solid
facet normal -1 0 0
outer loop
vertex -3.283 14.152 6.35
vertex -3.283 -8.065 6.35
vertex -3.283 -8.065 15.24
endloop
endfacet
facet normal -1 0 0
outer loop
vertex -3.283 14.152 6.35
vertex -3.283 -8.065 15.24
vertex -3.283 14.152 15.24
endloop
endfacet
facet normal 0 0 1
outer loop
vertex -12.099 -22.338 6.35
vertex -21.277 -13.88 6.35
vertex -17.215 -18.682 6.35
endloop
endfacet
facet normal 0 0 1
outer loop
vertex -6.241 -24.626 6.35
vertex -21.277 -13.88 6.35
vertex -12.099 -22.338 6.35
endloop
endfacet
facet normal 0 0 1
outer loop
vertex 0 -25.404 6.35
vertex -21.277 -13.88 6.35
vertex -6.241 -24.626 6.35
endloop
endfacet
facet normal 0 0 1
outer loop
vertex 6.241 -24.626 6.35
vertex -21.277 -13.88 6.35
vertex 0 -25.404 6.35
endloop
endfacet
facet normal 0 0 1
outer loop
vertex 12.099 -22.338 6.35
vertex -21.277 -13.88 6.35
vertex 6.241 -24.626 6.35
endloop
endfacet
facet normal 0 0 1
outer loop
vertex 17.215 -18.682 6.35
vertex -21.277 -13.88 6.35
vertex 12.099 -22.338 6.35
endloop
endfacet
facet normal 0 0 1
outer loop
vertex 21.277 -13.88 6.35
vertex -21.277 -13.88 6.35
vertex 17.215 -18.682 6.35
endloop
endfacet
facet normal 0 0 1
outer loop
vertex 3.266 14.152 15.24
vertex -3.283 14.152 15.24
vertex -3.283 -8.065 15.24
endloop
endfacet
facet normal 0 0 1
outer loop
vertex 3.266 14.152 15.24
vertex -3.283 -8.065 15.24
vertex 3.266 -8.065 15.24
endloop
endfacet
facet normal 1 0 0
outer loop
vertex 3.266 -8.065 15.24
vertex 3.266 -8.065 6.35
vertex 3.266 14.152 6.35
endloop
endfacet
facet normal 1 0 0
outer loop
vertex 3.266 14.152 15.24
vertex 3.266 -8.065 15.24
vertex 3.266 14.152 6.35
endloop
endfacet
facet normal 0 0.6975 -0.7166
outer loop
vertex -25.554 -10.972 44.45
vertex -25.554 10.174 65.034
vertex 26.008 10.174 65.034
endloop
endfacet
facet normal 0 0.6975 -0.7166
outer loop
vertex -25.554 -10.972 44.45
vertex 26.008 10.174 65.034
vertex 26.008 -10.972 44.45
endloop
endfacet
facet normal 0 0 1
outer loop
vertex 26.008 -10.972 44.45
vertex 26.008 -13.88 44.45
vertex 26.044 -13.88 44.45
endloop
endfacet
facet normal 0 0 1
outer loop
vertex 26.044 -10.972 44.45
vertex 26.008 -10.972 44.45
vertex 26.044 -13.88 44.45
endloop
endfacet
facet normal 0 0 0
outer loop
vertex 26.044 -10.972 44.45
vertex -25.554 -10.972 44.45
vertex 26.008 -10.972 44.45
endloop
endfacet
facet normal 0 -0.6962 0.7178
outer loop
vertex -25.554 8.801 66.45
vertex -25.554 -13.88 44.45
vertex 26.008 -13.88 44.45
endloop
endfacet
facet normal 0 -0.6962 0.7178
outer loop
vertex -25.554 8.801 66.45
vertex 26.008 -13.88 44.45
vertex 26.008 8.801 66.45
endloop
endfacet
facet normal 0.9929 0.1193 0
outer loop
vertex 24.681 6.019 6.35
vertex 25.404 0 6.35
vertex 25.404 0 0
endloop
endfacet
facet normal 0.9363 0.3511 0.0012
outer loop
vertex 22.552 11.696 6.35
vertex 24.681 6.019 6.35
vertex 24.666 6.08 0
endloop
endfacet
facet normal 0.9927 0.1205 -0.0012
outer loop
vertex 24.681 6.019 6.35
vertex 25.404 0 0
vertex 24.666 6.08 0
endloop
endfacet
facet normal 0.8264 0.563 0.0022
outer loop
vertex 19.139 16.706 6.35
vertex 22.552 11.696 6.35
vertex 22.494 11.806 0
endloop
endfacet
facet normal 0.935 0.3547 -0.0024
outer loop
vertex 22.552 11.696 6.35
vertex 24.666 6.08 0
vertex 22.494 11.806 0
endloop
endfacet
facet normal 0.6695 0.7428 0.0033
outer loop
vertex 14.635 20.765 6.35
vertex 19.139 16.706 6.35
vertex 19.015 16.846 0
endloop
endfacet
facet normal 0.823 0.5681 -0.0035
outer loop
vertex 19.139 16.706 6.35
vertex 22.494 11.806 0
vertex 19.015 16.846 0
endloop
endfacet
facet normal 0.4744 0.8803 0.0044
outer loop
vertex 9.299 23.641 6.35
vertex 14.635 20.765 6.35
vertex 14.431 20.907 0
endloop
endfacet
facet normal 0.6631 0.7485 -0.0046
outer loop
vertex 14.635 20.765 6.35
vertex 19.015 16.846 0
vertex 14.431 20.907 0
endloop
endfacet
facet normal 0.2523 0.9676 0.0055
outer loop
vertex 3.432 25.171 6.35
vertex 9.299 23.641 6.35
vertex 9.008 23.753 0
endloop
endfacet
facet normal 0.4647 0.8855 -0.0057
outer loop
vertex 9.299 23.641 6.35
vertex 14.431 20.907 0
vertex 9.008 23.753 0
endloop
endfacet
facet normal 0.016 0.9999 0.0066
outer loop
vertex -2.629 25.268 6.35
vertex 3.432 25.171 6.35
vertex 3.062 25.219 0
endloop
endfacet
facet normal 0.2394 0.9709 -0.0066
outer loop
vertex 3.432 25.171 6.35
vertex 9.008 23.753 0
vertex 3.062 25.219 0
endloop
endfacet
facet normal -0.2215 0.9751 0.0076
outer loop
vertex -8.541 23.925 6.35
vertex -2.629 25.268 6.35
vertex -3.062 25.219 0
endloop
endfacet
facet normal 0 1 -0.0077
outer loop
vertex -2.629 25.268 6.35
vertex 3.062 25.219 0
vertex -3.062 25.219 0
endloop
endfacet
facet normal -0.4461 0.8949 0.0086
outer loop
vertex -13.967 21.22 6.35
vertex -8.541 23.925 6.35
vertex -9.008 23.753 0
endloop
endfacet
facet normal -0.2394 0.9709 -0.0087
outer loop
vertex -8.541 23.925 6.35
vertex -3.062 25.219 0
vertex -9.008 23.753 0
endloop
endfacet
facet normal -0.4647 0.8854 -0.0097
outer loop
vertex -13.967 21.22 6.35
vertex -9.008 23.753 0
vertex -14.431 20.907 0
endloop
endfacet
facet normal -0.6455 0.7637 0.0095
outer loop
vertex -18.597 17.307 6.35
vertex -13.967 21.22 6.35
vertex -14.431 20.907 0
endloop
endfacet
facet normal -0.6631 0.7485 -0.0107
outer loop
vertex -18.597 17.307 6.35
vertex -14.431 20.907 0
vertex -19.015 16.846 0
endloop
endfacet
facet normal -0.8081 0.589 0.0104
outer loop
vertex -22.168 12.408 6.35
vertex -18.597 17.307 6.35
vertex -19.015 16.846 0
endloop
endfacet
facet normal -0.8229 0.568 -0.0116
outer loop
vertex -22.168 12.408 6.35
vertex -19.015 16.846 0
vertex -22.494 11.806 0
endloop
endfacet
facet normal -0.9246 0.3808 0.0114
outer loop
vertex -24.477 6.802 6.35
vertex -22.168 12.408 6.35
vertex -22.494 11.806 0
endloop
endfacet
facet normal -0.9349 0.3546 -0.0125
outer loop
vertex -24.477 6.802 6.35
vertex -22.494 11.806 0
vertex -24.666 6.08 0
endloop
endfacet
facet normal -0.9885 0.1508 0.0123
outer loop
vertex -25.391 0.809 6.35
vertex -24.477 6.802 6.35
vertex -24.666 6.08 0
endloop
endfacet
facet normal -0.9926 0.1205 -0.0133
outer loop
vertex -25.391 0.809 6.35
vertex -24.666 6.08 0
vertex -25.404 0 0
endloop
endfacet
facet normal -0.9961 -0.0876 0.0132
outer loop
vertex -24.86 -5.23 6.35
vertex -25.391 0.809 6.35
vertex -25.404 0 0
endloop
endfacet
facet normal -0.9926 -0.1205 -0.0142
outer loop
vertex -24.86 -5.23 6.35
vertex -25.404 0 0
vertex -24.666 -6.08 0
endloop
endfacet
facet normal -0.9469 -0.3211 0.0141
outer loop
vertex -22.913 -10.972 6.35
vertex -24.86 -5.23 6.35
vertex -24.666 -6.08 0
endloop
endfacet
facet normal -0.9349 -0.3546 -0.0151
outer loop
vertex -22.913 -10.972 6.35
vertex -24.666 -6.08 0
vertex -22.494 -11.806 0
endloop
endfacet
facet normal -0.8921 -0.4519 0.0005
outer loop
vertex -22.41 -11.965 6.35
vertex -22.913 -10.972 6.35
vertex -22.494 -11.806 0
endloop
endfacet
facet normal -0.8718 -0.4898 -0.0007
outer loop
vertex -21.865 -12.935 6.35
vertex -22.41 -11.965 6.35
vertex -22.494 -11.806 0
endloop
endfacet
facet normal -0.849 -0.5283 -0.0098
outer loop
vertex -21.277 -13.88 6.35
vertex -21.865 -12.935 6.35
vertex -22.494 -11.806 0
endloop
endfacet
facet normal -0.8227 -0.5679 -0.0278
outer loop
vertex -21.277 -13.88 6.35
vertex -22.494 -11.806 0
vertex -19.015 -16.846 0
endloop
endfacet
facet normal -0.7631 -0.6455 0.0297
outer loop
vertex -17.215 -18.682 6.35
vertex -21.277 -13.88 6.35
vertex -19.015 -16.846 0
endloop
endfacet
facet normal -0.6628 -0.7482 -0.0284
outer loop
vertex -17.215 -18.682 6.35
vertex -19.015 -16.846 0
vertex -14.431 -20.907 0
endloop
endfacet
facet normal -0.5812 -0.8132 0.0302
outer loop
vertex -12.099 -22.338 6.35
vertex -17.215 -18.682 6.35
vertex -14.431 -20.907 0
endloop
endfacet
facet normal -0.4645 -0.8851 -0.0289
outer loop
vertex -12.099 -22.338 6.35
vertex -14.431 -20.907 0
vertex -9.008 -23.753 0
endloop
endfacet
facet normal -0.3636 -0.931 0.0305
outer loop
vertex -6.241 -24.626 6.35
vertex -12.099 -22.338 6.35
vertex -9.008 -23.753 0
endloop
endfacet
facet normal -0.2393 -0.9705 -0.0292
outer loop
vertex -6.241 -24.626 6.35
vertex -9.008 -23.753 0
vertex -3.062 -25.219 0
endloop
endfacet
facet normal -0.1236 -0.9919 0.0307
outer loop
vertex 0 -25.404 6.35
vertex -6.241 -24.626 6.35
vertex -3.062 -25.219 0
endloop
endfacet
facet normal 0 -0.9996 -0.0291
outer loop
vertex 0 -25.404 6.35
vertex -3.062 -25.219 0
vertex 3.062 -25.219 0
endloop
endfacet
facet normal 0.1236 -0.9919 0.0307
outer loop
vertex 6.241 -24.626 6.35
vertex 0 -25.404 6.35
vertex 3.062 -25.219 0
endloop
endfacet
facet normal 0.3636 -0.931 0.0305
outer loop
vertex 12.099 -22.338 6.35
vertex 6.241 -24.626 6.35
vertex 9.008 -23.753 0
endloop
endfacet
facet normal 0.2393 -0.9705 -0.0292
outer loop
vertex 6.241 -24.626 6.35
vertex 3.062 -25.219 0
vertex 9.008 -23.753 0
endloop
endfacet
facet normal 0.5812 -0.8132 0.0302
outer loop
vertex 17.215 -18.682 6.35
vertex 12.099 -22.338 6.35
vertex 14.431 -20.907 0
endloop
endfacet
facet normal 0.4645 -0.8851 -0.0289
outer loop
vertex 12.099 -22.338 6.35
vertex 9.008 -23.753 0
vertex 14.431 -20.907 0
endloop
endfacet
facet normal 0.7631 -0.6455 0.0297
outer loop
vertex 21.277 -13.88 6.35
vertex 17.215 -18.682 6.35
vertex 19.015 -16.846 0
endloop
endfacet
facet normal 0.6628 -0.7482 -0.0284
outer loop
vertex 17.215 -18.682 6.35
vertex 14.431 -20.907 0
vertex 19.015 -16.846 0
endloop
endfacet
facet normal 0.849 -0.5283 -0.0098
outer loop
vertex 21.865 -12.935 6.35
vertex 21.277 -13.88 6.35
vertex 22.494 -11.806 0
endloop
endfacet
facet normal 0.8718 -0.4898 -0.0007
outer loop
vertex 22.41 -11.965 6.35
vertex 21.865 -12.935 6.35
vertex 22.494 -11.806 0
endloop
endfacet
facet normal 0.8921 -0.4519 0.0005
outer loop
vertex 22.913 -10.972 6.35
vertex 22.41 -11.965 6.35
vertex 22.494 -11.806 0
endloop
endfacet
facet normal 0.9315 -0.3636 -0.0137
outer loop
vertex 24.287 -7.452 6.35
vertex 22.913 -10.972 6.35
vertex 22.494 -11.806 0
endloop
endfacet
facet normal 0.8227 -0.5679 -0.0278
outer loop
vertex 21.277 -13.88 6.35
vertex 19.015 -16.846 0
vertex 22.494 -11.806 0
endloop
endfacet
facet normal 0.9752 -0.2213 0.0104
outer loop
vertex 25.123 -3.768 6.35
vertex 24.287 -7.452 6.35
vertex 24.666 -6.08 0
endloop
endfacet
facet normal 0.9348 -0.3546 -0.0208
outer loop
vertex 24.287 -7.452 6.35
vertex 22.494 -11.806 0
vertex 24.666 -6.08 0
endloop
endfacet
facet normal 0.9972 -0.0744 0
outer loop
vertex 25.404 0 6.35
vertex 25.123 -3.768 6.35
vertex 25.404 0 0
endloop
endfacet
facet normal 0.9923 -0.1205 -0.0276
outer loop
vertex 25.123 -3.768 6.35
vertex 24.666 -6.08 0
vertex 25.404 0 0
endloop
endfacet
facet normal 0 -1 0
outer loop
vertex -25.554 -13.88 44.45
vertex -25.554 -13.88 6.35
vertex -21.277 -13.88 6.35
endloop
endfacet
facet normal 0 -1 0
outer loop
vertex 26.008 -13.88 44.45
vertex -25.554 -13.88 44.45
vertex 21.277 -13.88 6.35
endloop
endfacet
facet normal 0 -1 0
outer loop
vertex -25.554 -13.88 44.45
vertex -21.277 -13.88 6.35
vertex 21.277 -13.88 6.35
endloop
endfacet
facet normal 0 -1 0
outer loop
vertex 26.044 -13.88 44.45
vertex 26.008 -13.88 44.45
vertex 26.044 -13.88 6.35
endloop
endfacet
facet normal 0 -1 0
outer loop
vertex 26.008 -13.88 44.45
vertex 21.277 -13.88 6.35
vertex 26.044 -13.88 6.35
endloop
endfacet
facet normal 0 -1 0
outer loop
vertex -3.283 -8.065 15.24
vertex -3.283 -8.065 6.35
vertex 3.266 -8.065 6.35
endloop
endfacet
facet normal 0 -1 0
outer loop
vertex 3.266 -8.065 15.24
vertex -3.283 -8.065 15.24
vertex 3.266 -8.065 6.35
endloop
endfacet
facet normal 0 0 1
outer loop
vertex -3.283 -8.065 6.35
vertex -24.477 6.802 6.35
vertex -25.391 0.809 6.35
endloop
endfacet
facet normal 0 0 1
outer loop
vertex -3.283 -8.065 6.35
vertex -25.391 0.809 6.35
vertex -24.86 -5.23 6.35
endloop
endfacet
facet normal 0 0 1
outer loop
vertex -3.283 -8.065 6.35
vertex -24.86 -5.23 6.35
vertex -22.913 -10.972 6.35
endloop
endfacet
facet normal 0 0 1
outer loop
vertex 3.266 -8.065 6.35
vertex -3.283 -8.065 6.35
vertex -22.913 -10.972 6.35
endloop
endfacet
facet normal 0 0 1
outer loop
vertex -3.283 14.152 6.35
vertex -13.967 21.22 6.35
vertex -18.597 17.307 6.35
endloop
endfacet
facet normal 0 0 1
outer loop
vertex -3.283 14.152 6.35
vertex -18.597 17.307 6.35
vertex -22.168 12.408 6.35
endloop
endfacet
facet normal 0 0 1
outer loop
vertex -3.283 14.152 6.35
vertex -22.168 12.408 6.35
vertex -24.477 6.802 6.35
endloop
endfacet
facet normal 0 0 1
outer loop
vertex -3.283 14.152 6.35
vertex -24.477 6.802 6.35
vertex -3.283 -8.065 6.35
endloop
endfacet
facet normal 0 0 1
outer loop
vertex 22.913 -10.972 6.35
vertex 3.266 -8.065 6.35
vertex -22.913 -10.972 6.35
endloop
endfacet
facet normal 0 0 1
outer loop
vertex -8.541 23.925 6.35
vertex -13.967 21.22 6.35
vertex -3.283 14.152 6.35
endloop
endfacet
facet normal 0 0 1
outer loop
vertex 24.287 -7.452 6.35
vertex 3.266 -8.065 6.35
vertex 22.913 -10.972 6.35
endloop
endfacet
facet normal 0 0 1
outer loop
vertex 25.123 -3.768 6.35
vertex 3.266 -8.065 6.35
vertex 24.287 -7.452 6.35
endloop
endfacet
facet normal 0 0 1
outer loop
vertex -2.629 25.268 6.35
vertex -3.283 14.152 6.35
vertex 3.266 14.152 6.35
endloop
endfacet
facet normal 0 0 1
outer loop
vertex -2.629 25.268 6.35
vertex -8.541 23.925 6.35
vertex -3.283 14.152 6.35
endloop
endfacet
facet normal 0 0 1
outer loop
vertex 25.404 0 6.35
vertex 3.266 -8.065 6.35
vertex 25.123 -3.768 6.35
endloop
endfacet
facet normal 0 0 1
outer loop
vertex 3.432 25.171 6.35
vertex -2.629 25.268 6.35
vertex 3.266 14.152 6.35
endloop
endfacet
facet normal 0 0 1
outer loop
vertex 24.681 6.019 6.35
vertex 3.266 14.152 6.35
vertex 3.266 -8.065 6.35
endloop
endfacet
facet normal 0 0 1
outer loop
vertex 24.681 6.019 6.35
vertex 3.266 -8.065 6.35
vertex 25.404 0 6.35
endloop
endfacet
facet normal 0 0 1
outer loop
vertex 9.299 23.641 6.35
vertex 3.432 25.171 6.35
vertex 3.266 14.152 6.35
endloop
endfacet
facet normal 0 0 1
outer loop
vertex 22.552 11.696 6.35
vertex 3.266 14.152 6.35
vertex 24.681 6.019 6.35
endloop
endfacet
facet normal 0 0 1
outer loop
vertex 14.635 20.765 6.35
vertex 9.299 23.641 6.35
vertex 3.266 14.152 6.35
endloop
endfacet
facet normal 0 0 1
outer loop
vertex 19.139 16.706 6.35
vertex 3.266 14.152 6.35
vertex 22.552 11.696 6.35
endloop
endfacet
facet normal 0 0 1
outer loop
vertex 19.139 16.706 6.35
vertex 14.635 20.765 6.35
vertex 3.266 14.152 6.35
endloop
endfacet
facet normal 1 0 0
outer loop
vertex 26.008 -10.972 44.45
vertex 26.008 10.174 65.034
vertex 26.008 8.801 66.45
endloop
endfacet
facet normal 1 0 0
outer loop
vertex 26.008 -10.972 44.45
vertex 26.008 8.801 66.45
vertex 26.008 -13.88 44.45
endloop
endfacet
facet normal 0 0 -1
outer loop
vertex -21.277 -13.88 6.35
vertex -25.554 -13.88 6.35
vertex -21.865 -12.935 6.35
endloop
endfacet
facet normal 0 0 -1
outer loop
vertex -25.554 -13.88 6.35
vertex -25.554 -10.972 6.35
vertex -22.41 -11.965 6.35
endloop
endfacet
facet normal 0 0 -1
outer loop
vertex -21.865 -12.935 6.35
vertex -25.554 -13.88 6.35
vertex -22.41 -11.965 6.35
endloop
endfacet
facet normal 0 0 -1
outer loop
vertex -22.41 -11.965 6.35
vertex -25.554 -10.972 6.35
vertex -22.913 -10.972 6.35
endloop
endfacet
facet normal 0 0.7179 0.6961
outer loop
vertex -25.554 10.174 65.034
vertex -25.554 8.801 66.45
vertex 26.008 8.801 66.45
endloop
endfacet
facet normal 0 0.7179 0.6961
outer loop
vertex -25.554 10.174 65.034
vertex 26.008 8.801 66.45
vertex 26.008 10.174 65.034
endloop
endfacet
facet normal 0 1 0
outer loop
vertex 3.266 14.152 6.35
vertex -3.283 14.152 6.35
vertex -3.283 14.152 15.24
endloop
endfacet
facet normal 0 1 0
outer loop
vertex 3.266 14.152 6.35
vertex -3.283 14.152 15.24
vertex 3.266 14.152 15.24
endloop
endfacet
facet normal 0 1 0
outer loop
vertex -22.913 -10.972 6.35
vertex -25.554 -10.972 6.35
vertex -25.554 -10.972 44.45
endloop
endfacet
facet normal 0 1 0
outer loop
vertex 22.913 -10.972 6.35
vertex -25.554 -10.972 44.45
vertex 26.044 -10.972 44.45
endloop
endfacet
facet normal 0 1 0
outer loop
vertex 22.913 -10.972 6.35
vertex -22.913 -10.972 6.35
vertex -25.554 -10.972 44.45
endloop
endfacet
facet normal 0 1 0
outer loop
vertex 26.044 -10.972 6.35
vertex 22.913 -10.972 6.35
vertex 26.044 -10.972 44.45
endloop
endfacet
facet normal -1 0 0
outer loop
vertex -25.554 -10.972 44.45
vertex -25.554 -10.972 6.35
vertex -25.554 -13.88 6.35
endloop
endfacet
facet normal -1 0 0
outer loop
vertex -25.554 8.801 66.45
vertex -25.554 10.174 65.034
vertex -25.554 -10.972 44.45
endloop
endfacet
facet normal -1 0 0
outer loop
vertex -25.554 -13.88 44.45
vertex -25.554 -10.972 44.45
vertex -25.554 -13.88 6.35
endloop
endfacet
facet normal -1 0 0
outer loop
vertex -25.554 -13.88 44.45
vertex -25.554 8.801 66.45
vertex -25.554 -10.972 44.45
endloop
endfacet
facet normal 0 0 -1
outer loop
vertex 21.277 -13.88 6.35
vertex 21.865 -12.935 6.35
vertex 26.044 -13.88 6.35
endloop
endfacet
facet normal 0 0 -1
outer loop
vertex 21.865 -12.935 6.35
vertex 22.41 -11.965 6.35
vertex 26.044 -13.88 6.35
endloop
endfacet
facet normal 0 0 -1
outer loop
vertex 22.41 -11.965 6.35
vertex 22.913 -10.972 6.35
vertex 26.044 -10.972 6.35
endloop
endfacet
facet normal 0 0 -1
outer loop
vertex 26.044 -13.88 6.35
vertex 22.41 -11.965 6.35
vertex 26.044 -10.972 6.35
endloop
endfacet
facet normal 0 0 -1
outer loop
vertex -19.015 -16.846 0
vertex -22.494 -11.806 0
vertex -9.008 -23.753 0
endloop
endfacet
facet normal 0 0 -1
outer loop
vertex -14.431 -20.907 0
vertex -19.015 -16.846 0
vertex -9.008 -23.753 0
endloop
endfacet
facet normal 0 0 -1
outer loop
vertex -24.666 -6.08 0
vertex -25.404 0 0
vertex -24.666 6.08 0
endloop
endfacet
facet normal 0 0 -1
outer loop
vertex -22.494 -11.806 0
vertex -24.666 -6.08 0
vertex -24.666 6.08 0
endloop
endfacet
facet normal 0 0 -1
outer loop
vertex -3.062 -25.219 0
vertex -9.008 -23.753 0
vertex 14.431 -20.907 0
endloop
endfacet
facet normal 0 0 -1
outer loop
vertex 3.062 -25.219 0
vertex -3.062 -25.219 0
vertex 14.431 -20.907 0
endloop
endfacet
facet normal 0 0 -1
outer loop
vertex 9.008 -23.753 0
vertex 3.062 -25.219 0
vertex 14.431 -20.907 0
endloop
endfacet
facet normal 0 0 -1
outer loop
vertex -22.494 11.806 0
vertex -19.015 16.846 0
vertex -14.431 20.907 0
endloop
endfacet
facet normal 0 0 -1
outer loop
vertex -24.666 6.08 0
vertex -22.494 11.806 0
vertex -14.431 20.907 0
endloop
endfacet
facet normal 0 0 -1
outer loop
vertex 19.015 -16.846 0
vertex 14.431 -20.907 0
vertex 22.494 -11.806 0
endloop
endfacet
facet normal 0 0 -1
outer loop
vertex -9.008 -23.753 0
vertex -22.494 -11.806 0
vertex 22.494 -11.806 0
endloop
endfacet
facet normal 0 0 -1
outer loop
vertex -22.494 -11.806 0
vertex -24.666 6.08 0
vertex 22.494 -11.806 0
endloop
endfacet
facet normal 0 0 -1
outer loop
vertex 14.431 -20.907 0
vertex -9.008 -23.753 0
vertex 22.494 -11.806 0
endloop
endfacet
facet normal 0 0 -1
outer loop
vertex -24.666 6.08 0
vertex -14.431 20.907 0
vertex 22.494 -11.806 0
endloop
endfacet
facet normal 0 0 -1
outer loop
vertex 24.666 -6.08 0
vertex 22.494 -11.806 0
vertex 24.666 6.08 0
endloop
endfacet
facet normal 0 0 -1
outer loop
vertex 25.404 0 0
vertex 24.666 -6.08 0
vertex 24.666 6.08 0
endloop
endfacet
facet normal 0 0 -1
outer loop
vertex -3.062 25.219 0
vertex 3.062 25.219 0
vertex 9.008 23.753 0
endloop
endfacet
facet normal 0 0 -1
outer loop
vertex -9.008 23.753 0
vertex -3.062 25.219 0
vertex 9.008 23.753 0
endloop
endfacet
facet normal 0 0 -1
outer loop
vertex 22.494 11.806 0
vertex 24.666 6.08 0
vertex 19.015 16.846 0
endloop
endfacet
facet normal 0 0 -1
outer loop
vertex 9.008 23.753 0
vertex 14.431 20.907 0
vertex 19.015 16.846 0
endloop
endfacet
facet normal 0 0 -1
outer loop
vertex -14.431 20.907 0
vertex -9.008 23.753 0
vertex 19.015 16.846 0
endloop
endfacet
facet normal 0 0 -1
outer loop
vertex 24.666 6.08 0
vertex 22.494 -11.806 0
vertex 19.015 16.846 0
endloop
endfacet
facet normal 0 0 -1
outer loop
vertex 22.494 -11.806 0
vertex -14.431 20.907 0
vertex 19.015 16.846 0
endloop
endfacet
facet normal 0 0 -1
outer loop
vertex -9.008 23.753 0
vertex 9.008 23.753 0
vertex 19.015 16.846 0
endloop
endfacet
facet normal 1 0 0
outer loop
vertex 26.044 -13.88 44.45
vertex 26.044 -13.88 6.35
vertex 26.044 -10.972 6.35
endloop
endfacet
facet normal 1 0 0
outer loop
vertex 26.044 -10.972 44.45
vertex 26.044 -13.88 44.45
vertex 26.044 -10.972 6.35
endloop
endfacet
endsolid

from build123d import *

# Parameters (mm, degrees)
F0_R     = 25.404273
F1_DEPTH = 6.35
F2_W     = 51.59829
F2_H     = 2.908727
F3_DEPTH = 38.1
F5_DEPTH = 51.562
F6_W     = 6.548917
F6_H     = 22.217193
F7_DEPTH = 8.89


with BuildPart() as f1:
    # F0 (on Top) → F1 (new body)
    with BuildSketch(Plane.XY):
        Circle(F0_R)
    extrude(amount=F1_DEPTH)

    # F2 (on face) → F3 (join)
    with BuildSketch(Plane.XY.offset(6.35)):
        with Locations((0.245198, -12.426103)):
            Rectangle(F2_W, F2_H)
    extrude(amount=F3_DEPTH)

    # F4 (on face) → F5 (join)
    with BuildSketch(Plane(origin=(-25.553947, 0, 0), x_dir=(0, -1, 0), z_dir=(-1, 0, 0))):
        Polygon((10.97174, 44.45), (13.880467, 44.45), (-8.800617, 66.449516), (-10.174005, 65.033579), align=None)
    extrude(amount=-F5_DEPTH)

    # F6 (on face) → F7 (join)
    with BuildSketch(Plane.XY.offset(6.35)):
        with Locations((-0.008409, 3.043202)):
            Rectangle(F6_W, F6_H)
    extrude(amount=F7_DEPTH)


solid = f1.part
